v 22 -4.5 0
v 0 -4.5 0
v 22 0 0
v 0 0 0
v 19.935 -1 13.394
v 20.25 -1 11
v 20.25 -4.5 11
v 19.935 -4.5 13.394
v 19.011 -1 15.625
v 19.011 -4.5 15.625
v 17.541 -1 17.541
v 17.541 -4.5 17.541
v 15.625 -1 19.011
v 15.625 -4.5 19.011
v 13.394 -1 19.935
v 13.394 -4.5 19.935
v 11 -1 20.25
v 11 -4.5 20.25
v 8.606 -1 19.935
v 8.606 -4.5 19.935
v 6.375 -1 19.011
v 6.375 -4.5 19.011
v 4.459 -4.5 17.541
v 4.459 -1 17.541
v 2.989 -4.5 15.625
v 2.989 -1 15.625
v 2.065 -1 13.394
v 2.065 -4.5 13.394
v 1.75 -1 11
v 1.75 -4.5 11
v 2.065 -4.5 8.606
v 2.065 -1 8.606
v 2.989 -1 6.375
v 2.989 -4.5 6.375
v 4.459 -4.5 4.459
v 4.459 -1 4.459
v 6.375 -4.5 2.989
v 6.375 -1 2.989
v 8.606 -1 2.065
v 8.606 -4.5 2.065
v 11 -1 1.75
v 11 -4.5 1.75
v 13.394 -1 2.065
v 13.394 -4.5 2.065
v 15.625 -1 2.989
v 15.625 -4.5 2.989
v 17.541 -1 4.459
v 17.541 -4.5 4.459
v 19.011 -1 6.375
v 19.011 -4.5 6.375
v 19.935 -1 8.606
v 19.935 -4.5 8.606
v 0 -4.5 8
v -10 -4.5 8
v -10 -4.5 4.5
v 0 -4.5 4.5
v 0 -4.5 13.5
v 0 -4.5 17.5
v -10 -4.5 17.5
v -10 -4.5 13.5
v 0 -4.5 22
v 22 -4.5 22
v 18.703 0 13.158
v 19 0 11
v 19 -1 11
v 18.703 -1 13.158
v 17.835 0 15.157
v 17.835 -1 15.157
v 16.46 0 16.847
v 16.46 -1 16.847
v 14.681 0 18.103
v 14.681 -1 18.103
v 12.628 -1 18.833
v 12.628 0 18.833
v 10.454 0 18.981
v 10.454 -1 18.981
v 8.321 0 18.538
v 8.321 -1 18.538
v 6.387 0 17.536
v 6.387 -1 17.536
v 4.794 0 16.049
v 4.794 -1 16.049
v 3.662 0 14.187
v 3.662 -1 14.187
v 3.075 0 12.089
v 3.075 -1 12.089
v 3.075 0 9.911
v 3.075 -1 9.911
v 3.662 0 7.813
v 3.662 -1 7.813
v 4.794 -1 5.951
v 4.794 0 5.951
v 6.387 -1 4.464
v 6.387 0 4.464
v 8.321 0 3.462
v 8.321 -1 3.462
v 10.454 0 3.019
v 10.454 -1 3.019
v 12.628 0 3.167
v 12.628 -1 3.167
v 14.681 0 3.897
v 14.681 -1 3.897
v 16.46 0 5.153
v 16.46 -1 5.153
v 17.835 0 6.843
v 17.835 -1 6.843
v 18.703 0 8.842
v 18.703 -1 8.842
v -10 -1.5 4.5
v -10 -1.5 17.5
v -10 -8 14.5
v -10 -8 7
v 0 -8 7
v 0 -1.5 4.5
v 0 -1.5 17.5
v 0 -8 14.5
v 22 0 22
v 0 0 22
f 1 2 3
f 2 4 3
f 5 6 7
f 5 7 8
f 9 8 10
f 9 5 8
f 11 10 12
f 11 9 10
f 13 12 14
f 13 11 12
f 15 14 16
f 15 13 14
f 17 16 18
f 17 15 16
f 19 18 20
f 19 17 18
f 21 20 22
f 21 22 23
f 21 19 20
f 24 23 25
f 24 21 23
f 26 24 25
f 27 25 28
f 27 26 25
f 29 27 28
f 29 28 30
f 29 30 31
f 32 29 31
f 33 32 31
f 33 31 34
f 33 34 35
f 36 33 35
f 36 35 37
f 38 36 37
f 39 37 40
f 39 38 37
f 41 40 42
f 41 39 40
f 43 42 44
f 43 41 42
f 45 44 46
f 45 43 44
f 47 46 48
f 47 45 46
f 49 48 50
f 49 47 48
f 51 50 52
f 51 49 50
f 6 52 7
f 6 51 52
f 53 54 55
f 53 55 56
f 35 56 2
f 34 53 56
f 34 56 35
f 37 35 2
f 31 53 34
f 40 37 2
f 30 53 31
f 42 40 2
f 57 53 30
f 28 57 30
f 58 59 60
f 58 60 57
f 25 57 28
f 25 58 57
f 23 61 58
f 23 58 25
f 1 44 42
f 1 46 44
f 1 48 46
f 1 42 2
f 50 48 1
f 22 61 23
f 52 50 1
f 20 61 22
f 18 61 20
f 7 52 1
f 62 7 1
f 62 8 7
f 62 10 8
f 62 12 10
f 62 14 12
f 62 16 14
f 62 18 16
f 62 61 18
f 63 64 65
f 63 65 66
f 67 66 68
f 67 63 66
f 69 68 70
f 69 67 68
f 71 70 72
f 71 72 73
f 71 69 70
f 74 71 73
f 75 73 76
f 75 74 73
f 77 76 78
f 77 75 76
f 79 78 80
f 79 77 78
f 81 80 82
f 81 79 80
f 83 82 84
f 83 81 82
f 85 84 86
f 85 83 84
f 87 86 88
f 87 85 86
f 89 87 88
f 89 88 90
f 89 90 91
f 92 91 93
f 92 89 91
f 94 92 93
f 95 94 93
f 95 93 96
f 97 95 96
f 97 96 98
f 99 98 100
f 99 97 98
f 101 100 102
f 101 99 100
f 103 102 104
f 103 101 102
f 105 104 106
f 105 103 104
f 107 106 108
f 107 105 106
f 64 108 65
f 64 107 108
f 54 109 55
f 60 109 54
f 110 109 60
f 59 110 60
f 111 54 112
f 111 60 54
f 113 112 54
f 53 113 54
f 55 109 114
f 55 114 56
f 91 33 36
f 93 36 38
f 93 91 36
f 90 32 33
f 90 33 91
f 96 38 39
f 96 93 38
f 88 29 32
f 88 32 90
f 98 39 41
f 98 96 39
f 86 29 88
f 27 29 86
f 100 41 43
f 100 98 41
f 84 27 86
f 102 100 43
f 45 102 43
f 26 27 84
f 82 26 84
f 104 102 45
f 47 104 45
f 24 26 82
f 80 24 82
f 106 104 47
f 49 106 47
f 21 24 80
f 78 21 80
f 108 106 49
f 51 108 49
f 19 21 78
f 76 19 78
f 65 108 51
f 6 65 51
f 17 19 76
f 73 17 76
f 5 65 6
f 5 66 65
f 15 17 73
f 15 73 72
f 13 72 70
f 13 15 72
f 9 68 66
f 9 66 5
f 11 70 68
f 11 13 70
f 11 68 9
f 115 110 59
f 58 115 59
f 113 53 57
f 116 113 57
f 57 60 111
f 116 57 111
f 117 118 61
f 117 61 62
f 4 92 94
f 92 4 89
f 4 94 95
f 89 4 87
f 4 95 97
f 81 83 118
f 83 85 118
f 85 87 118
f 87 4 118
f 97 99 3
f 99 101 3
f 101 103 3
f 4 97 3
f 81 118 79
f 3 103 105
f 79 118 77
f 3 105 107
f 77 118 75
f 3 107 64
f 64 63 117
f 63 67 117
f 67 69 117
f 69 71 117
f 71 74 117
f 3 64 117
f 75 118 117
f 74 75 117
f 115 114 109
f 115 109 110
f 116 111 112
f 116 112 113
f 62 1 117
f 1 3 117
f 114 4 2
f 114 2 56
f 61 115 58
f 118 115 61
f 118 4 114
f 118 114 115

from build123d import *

# Parameters (mm, degrees)
F0_W      = 22
F0_H      = 22
F0_R      = 8
F1_DEPTH  = 1
F2_W      = 22
F2_H      = 22
F2_R      = 9.25
F3_DEPTH  = 3.5
F4_W      = 3
F4_H      = 13
F5_DEPTH  = 10
F6_W      = 10
F6_H      = 7.5
F7_DEPTH  = 3.5
F9_DEPTH  = 10
F10_DEPTH = 10


with BuildPart() as f1:
    # F0 (on Front) → F1 (new body)
    with BuildSketch(Plane.XZ):
        with Locations((11, 11)):
            Rectangle(F0_W, F0_H)
        with Locations((11, 11)):
            Circle(F0_R, mode=Mode.SUBTRACT)
    extrude(amount=F1_DEPTH)

    # F2 (on face) → F3 (join)
    with BuildSketch(Plane.XZ.offset(1)):
        with Locations((11, 11)):
            Rectangle(F2_W, F2_H)
        with Locations((11, 11)):
            Circle(F2_R, mode=Mode.SUBTRACT)
    extrude(amount=F3_DEPTH)

    # F4 (on face) → F5 (join)
    with BuildSketch(Plane(origin=(0, 0, 0), x_dir=(0, -1, 0), z_dir=(-1, 0, 0))):
        with Locations((3, 11)):
            Rectangle(F4_W, F4_H)
    extrude(amount=F5_DEPTH)

    # F6 (on face) → F7 (join)
    with BuildSketch(Plane.XZ.offset(4.5)):
        with Locations((-5, 10.75)):
            Rectangle(F6_W, F6_H)
    extrude(amount=F7_DEPTH)

    # F8 (on face) → F9 (cut)
    with BuildSketch(Plane(origin=(-10, 0, 0), x_dir=(0, -1, 0), z_dir=(-1, 0, 0))):
        Polygon((4.5, 7), (8, 7), (4.5, 8), align=None)
    extrude(amount=-F9_DEPTH, mode=Mode.SUBTRACT)

    # F8 (on face) → F10 (cut)
    with BuildSketch(Plane(origin=(-10, 0, 0), x_dir=(0, -1, 0), z_dir=(-1, 0, 0))):
        Polygon((4.5, 13.5), (8, 14.5), (4.5, 14.5), align=None)
    extrude(amount=-F10_DEPTH, mode=Mode.SUBTRACT)


solid = f1.part
